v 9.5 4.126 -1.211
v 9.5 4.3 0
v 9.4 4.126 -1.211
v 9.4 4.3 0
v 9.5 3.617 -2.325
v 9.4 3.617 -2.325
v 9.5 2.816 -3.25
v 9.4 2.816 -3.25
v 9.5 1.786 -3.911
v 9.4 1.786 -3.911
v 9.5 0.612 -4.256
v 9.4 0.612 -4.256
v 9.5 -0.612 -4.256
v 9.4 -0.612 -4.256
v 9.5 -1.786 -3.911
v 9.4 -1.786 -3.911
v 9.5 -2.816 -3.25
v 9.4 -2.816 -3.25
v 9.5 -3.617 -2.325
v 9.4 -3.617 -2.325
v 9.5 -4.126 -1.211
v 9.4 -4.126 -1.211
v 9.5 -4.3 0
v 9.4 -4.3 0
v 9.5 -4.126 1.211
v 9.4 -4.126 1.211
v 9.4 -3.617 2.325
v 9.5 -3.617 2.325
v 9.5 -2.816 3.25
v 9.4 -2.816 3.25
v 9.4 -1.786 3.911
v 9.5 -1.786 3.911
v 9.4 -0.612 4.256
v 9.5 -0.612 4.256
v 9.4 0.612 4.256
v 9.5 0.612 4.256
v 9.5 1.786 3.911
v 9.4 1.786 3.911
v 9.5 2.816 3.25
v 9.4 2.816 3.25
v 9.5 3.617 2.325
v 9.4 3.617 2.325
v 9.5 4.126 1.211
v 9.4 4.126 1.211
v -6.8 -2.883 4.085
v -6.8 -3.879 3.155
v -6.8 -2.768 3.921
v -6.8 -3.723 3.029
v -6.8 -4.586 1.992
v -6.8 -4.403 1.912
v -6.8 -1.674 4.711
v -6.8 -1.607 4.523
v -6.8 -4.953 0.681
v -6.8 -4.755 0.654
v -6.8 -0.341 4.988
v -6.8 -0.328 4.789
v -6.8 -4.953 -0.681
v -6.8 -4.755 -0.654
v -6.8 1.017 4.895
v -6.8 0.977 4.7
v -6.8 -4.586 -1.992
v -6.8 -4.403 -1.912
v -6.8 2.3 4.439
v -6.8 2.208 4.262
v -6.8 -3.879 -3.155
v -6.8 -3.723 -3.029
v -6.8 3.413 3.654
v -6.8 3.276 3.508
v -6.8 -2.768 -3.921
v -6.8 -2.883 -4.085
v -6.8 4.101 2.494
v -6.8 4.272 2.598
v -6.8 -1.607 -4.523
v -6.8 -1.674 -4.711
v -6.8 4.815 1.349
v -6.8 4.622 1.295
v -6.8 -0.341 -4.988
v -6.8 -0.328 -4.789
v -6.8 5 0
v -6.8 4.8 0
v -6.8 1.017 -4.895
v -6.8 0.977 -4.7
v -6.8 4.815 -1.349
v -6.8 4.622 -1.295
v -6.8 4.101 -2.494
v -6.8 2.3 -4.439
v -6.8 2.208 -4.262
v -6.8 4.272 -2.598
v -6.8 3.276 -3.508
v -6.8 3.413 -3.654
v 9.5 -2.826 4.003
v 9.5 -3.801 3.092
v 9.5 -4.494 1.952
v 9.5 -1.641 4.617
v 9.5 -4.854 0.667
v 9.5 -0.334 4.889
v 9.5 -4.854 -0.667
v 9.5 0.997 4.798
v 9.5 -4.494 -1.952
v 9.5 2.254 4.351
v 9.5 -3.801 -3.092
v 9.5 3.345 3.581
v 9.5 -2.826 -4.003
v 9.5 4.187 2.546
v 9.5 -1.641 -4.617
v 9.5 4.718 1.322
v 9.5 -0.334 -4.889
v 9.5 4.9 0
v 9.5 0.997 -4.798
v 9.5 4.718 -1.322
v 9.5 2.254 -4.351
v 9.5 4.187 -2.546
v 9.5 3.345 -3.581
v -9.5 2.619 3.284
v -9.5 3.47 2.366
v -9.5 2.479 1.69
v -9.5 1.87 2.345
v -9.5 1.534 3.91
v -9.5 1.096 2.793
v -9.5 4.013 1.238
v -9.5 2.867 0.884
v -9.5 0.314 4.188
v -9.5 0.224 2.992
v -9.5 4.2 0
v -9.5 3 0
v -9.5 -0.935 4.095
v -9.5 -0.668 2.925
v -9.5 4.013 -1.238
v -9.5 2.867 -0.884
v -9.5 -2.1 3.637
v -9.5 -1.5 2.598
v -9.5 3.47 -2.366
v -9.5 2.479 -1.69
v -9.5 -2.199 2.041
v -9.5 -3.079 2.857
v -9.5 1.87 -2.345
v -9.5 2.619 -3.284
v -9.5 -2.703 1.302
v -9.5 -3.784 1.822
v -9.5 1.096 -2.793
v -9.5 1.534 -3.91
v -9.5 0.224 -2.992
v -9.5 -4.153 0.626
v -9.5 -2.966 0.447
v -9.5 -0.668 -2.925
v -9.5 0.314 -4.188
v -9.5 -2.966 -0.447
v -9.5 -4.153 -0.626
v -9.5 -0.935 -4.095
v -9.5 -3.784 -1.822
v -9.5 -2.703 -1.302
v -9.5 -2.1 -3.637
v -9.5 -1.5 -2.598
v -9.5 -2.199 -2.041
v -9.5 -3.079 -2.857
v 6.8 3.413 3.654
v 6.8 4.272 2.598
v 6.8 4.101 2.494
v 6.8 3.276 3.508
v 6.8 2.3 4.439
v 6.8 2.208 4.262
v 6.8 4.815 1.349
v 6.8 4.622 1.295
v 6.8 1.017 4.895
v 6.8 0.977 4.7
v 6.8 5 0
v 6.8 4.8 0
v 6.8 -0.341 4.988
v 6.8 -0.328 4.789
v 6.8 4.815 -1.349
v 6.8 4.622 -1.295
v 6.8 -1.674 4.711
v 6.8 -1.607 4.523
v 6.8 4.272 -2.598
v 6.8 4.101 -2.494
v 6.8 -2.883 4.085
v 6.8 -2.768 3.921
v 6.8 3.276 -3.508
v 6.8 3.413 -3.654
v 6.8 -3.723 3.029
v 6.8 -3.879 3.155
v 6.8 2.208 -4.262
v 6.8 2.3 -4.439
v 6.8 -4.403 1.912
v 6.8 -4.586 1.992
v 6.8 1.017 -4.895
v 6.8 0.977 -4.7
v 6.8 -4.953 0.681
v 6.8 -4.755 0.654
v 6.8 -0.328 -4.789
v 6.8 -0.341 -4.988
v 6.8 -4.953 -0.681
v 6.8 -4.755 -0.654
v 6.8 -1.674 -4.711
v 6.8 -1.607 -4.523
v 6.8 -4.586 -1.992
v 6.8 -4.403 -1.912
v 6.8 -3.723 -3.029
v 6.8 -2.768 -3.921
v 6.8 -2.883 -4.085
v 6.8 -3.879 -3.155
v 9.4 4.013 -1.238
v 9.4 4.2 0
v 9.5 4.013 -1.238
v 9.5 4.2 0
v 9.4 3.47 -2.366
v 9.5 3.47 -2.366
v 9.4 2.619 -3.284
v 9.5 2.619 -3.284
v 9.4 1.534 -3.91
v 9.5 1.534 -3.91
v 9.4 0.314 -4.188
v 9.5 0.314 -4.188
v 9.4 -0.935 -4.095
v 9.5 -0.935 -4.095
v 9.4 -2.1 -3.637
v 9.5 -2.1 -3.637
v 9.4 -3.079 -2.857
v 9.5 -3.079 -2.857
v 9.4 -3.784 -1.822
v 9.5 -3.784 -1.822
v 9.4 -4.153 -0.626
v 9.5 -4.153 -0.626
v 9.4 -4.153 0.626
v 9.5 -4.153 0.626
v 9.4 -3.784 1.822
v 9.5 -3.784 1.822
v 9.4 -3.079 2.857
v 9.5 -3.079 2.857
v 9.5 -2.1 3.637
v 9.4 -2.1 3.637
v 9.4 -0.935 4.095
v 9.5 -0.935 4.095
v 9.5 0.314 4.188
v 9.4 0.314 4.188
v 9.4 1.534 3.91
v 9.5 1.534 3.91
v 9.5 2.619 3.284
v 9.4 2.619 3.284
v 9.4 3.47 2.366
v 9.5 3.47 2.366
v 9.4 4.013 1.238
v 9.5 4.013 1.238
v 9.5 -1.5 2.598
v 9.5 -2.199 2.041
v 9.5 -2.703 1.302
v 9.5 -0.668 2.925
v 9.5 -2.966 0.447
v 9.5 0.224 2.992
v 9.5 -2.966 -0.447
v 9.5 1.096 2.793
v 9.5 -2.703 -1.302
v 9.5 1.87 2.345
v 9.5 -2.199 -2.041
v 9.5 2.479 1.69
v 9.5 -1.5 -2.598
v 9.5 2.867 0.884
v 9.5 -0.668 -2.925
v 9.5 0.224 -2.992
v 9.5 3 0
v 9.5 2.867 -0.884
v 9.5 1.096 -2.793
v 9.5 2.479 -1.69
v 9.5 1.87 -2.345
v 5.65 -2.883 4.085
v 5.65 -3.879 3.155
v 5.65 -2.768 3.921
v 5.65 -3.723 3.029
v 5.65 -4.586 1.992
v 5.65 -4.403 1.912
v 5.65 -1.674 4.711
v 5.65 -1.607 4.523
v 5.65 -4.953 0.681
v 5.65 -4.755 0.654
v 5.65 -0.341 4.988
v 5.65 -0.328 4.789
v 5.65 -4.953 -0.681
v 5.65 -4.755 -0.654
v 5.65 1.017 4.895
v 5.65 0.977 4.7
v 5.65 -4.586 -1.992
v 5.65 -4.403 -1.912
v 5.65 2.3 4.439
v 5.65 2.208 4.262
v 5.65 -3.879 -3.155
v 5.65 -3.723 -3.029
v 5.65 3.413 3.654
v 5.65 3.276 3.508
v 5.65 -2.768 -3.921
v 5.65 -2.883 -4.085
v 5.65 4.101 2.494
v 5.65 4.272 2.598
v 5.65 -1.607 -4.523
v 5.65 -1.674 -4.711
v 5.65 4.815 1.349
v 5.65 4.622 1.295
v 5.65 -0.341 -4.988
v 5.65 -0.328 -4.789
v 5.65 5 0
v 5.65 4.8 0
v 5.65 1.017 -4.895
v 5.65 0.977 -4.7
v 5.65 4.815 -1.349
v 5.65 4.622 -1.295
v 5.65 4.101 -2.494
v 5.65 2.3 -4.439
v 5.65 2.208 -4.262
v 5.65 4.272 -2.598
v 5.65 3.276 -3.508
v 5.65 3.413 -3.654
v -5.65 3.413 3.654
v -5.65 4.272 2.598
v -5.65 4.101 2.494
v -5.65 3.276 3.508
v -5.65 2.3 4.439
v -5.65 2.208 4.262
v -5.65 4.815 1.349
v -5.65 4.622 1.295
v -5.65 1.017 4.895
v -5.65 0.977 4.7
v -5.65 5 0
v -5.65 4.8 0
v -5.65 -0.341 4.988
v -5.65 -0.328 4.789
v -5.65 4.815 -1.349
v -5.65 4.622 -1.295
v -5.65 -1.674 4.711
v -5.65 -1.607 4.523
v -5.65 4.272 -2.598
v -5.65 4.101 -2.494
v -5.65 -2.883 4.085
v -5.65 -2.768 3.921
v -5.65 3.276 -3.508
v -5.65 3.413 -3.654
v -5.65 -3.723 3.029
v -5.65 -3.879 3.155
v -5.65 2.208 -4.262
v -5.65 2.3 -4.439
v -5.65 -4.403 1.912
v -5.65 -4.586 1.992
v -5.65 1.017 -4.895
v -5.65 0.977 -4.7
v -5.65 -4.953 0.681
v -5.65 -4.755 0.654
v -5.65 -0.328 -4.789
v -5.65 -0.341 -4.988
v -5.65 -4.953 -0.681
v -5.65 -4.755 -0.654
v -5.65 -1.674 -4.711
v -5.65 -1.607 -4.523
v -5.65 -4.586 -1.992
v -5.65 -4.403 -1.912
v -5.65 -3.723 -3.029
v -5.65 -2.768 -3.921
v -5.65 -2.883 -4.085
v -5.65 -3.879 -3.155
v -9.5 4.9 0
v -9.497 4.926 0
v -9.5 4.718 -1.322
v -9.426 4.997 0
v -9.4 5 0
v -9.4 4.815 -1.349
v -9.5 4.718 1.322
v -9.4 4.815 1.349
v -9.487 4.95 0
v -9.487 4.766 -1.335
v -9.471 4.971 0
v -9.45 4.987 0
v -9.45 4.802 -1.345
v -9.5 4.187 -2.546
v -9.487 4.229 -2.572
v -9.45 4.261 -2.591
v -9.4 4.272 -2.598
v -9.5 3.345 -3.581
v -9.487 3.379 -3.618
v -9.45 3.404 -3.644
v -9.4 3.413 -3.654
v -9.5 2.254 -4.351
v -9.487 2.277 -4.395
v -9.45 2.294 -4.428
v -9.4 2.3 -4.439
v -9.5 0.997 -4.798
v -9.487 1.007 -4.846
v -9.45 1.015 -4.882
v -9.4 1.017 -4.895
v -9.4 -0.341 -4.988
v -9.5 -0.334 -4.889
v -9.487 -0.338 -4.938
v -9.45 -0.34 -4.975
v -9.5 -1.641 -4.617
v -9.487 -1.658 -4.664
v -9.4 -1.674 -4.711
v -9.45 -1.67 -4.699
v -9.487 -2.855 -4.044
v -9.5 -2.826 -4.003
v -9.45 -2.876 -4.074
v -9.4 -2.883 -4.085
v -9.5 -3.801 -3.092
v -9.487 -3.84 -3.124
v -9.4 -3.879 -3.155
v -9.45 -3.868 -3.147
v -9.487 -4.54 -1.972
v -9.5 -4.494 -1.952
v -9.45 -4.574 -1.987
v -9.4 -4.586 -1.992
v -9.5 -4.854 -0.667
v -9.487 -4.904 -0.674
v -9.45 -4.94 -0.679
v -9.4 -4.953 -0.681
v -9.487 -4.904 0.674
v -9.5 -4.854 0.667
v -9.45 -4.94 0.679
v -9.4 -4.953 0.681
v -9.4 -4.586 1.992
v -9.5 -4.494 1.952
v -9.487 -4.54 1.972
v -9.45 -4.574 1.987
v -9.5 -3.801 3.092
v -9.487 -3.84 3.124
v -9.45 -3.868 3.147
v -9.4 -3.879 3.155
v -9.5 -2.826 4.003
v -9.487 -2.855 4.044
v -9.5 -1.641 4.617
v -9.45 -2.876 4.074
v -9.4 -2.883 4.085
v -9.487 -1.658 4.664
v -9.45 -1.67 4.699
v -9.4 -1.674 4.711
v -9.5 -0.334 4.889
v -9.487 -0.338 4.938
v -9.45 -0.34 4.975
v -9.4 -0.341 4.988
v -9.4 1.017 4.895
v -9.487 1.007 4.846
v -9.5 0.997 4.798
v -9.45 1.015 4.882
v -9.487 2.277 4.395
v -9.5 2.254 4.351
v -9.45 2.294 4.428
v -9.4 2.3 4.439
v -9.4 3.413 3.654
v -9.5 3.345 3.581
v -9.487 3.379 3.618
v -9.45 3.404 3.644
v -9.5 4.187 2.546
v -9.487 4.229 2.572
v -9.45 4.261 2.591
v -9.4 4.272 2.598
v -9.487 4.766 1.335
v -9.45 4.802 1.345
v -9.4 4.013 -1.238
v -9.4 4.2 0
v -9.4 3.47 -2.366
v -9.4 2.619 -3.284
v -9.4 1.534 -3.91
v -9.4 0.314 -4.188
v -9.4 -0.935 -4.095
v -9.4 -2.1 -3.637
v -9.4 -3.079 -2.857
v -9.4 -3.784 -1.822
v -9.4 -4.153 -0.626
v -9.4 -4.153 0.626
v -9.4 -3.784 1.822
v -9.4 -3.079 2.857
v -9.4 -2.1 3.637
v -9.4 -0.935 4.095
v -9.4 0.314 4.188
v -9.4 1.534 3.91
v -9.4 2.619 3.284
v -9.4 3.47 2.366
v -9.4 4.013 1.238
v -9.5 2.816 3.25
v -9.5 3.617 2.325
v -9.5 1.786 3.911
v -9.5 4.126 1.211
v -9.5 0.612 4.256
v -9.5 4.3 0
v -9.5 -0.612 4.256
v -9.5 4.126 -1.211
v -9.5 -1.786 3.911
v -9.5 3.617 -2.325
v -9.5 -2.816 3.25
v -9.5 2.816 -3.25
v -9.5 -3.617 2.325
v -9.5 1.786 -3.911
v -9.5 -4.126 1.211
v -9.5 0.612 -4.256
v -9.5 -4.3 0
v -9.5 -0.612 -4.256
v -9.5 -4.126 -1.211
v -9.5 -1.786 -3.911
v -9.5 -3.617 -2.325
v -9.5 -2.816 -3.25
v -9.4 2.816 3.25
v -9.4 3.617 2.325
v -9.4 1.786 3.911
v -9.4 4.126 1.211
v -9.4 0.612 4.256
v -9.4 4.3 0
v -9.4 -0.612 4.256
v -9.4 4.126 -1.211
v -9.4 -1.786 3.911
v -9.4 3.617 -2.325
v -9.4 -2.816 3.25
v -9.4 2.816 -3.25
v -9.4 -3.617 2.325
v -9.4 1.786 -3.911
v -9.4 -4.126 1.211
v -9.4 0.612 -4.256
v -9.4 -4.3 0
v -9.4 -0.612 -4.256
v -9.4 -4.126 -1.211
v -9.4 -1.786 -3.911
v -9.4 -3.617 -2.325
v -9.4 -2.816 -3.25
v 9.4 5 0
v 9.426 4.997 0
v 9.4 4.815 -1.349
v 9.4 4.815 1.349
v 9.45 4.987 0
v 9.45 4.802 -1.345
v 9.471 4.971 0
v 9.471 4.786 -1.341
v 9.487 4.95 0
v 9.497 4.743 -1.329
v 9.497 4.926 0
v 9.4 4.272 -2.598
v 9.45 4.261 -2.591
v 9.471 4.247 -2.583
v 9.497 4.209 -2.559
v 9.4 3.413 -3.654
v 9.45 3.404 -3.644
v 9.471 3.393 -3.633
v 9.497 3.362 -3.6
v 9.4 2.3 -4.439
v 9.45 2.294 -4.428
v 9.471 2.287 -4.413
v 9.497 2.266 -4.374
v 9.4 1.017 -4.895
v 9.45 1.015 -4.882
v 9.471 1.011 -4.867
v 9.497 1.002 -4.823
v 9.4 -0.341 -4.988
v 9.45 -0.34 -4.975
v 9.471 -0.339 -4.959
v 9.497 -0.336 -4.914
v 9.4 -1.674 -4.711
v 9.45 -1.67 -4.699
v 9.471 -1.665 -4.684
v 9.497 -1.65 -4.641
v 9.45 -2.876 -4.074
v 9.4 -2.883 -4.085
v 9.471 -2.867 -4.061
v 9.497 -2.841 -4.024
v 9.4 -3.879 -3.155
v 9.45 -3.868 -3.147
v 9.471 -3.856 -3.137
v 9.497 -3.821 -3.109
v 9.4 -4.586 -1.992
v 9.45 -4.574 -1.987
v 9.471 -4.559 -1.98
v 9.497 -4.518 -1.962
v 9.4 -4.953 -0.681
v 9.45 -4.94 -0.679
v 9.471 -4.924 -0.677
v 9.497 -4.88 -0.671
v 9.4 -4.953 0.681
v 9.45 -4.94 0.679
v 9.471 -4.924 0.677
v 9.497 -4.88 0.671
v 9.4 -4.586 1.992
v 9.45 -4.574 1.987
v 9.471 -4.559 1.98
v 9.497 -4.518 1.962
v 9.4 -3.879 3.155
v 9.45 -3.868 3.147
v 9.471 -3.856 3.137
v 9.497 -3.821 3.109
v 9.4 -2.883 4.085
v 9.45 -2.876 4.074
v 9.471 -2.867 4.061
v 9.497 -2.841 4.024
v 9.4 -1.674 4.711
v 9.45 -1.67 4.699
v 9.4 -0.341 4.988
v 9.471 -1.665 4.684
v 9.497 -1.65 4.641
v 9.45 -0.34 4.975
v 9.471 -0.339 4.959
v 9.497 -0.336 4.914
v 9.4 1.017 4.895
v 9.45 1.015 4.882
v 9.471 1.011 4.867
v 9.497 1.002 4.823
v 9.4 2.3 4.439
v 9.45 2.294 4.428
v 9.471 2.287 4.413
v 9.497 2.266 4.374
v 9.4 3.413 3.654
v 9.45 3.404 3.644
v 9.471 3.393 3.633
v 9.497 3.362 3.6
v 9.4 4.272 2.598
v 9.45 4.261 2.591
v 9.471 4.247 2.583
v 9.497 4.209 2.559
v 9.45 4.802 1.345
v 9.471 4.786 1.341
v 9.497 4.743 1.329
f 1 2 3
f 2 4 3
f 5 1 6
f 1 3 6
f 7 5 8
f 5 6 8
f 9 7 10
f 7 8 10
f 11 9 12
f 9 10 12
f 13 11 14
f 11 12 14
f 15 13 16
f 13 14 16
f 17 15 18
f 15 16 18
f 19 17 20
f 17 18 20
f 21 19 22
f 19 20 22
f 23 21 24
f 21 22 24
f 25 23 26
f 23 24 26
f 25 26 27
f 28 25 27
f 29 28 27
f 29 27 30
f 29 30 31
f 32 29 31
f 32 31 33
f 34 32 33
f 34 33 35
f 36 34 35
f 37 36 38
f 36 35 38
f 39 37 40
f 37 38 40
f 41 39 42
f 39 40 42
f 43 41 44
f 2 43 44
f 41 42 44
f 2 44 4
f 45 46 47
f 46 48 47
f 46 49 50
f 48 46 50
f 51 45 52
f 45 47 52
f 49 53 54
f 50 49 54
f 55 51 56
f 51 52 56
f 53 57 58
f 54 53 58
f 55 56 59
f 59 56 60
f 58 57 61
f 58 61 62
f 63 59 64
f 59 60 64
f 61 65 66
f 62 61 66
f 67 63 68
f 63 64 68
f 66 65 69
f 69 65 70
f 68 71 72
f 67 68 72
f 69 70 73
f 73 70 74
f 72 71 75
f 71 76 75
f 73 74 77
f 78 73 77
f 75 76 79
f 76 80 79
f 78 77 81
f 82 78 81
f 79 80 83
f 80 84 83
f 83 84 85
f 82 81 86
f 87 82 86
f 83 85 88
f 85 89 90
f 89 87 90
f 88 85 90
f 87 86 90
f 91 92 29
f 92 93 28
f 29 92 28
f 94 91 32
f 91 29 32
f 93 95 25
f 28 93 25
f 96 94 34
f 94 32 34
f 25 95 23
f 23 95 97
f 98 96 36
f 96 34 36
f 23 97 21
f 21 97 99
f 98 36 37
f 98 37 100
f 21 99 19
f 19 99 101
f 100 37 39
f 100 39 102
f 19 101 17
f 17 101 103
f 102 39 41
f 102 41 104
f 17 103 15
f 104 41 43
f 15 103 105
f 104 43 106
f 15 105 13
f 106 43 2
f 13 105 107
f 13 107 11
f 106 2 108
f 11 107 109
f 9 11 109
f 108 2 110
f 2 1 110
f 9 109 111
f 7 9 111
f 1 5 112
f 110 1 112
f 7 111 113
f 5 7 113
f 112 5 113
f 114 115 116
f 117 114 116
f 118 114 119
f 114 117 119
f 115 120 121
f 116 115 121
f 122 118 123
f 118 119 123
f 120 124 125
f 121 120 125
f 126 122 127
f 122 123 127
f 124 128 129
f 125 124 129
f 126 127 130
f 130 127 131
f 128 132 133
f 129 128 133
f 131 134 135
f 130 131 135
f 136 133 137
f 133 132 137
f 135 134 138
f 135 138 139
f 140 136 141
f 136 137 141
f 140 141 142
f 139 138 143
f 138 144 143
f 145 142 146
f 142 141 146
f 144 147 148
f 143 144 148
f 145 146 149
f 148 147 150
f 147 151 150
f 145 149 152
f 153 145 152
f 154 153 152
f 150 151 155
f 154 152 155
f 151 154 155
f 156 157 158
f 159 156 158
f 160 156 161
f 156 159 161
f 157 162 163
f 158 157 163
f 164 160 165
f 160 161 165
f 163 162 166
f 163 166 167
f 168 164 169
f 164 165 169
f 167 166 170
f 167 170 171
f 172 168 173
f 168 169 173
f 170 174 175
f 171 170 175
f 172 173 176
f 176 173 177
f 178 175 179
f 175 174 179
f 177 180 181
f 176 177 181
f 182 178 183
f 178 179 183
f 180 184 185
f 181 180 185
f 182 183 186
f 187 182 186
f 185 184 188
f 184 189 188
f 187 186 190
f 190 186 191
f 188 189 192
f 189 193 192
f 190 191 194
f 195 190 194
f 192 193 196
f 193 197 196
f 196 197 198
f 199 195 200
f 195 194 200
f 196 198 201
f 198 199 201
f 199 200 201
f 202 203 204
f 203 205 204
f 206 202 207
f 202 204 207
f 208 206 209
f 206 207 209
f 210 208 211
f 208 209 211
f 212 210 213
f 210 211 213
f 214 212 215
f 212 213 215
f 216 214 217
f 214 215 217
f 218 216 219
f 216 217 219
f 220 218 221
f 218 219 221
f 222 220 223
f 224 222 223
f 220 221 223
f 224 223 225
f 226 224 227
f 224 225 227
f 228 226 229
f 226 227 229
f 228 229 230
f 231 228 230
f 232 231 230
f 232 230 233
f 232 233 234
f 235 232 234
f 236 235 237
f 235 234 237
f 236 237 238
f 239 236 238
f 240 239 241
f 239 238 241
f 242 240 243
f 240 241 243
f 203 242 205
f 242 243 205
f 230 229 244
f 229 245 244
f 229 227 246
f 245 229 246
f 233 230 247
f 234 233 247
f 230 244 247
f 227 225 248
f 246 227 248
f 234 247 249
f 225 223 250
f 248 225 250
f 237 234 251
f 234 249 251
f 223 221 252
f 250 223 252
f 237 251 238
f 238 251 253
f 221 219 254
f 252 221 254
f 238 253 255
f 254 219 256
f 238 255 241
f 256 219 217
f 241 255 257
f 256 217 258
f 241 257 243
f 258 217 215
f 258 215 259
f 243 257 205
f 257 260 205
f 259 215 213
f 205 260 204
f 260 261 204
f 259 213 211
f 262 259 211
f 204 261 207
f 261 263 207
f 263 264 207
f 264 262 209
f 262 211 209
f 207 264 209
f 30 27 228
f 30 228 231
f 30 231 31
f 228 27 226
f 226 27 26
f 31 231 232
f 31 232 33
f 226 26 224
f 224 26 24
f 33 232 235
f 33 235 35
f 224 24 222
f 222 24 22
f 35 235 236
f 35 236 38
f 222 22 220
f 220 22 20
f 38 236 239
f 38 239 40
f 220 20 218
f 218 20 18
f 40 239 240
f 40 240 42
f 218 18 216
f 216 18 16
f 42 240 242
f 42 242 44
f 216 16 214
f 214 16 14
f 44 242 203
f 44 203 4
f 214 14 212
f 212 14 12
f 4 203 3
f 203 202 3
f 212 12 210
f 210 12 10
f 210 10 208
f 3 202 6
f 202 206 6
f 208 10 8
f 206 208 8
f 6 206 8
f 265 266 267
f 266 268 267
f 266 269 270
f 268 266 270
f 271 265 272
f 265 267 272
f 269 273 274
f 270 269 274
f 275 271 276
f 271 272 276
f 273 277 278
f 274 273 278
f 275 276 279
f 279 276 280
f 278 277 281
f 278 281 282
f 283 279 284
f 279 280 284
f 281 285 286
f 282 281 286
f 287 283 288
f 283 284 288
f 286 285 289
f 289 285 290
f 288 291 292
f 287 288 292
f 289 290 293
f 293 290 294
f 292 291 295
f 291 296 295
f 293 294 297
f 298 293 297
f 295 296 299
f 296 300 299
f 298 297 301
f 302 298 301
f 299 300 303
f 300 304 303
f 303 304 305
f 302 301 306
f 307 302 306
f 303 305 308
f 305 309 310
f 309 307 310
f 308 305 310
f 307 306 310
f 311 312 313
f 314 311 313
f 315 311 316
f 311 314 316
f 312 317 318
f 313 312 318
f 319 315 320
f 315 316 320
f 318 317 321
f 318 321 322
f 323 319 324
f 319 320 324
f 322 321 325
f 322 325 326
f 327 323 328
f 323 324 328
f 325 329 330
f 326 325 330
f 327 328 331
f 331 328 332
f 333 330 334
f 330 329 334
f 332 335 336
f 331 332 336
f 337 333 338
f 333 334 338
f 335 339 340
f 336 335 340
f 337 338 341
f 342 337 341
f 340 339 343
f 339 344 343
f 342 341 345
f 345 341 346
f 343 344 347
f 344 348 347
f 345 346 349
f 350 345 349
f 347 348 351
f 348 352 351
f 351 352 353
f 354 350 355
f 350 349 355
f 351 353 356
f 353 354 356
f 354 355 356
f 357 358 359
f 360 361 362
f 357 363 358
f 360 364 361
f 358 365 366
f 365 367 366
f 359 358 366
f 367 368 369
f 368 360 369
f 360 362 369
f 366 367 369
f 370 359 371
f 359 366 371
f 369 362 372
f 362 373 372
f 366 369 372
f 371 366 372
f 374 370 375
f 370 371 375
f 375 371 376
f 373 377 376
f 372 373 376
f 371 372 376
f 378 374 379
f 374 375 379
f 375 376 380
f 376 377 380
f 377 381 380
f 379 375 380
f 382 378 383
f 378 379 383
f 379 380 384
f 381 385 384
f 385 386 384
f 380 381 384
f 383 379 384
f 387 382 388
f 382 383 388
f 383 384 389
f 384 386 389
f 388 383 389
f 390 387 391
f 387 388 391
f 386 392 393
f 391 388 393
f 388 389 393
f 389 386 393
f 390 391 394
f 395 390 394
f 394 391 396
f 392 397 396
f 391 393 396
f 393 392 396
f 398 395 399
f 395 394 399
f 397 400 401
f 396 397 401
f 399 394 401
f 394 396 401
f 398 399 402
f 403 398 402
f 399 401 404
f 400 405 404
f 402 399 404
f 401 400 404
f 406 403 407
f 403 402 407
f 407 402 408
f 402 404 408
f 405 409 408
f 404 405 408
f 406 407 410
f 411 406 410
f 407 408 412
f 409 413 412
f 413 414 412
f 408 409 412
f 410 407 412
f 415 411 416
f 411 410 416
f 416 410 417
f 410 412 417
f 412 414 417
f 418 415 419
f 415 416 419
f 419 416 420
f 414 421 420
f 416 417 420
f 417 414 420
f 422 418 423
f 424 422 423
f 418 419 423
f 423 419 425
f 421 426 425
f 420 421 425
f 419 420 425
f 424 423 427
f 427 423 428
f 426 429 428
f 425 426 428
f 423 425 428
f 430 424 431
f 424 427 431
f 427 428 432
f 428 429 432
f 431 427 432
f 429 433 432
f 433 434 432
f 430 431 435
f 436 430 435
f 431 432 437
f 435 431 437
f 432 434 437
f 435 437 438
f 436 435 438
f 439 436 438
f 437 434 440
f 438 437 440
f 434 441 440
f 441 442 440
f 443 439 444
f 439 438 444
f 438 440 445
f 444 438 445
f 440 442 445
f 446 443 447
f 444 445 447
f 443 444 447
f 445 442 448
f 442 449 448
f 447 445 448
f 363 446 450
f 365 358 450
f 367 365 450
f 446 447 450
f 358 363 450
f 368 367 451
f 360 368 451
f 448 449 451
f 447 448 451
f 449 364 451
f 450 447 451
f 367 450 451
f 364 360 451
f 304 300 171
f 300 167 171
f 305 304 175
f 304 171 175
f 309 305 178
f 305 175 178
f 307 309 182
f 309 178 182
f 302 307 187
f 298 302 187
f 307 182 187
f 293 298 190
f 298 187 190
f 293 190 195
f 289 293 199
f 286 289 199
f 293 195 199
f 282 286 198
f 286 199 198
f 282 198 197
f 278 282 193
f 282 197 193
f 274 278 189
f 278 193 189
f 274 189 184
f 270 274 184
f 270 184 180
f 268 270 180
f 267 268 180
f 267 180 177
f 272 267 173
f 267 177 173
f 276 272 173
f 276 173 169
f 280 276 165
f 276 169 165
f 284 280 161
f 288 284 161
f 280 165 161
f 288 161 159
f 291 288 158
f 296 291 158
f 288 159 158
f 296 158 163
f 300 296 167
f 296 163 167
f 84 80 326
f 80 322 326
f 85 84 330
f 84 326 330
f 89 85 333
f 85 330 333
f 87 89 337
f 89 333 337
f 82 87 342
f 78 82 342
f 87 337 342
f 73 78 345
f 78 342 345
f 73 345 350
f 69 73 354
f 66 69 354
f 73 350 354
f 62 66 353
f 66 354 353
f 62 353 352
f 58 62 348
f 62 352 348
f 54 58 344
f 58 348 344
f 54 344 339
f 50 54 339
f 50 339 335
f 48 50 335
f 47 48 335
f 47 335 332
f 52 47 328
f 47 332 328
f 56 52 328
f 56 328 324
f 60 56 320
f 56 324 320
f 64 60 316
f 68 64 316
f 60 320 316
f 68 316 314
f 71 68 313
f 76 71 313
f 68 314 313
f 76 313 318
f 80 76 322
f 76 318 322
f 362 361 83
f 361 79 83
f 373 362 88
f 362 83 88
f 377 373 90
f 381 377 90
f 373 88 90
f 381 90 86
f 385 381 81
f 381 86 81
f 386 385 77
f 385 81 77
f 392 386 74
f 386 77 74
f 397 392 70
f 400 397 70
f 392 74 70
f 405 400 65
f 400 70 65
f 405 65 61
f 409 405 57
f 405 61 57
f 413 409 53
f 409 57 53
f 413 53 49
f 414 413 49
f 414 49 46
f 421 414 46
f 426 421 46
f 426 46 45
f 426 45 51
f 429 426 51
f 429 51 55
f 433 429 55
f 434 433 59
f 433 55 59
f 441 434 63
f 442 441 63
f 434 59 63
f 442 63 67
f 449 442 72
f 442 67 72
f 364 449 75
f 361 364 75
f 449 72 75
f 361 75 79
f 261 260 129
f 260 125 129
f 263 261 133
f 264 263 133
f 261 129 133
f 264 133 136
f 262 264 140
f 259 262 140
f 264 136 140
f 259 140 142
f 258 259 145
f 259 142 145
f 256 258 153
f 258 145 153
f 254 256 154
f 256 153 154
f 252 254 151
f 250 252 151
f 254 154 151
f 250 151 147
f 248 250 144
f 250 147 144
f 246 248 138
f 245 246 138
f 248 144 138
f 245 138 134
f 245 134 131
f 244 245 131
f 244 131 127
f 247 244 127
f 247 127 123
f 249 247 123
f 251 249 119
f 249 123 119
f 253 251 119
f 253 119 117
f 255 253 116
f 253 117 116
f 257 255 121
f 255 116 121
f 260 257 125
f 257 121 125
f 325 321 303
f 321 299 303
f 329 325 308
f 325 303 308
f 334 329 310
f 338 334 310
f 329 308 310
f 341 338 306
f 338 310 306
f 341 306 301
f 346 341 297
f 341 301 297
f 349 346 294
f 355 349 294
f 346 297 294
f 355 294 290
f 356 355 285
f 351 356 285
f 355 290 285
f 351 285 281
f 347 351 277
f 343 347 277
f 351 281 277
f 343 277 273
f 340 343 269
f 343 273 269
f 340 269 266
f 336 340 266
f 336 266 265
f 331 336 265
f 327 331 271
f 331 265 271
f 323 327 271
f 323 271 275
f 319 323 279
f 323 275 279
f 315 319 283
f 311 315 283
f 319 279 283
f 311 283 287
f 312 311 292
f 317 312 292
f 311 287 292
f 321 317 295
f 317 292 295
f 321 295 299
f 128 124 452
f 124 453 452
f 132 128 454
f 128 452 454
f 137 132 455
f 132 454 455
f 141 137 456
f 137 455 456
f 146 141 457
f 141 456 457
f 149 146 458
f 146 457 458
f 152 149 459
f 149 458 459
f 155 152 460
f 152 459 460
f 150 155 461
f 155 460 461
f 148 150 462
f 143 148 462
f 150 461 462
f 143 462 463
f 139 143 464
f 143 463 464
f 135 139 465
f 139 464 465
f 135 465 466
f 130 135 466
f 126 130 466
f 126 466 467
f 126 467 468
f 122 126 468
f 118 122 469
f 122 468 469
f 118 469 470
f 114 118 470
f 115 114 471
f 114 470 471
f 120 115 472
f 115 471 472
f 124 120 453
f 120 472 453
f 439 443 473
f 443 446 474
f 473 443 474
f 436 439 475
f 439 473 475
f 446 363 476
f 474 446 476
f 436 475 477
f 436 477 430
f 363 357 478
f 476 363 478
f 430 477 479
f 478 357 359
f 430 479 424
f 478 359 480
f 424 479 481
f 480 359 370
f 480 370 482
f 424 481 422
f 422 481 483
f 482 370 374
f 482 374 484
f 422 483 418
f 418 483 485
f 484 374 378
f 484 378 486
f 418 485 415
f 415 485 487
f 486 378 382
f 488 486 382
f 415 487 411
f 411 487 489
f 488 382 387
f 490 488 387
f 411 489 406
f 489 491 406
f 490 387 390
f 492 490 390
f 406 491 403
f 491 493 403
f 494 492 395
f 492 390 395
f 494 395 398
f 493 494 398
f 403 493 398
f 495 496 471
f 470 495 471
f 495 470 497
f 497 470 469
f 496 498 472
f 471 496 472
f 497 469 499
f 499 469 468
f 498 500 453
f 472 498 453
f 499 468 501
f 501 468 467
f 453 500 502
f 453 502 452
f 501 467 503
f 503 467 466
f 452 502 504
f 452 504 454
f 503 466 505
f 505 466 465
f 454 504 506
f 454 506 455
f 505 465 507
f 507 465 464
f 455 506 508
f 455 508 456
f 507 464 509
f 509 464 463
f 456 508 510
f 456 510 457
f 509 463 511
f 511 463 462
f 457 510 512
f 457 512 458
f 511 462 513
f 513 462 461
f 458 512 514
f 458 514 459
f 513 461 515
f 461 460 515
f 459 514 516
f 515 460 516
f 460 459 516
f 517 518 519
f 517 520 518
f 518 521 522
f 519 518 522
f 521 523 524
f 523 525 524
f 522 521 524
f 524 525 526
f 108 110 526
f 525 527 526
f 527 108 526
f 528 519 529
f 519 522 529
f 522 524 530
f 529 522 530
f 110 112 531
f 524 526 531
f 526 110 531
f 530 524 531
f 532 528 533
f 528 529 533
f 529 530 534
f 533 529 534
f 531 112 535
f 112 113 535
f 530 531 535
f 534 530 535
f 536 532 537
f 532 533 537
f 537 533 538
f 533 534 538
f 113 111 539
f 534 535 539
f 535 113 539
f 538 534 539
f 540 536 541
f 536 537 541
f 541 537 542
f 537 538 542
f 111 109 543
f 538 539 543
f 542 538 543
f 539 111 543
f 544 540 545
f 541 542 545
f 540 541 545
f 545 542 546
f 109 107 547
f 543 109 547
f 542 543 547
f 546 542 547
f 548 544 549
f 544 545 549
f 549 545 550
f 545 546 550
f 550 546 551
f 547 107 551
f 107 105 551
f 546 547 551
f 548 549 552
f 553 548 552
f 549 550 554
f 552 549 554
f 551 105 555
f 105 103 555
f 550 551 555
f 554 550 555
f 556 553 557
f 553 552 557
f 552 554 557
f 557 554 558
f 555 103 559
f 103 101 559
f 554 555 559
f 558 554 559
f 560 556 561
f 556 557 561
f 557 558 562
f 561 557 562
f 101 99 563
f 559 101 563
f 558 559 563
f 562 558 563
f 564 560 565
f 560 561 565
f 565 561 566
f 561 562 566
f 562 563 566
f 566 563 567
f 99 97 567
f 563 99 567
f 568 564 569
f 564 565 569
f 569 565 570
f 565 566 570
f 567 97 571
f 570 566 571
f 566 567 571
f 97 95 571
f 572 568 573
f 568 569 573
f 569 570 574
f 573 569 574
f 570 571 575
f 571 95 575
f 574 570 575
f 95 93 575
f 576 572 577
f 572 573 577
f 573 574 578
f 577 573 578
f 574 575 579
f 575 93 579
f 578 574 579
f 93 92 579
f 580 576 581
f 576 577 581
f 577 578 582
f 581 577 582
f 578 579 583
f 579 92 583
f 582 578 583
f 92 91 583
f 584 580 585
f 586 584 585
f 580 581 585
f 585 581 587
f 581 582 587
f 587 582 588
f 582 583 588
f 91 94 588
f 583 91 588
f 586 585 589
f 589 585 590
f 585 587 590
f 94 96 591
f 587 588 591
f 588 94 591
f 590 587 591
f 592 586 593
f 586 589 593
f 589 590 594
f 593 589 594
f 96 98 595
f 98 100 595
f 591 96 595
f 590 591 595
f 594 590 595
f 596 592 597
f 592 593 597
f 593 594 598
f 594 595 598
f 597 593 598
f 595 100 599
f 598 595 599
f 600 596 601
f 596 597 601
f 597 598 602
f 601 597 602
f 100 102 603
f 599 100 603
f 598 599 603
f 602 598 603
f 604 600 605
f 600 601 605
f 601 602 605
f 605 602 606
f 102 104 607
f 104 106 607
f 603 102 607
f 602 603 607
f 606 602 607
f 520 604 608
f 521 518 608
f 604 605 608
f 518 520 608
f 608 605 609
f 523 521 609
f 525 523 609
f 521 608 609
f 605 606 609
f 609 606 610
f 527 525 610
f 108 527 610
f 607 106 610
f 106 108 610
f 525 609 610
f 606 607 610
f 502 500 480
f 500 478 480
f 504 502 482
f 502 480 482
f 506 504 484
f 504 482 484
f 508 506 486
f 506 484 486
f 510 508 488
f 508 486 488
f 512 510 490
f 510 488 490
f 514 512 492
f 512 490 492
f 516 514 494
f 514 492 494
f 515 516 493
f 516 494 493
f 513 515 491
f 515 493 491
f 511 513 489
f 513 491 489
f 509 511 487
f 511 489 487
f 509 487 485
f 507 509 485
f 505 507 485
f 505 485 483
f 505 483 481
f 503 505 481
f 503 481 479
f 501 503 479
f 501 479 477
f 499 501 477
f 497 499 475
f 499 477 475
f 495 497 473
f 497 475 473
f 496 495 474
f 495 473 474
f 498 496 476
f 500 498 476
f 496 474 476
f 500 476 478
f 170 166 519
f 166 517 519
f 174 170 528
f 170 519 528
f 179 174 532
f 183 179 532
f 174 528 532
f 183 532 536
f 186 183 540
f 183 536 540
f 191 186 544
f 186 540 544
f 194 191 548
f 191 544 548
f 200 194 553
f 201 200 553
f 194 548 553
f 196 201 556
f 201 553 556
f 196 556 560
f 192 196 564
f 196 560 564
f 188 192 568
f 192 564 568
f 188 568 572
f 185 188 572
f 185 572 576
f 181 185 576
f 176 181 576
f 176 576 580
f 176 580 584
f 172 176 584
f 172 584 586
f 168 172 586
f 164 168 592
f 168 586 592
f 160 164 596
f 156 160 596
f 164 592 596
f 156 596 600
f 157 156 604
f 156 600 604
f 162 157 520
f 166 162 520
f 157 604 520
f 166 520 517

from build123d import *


with BuildPart() as part:
    # Sketch1 → Revolve1 (revolve)
    with BuildSketch(Plane(origin=(0, 0, 0), x_dir=(-1, 0, 0), z_dir=(0, 0, -1))):
        with BuildLine():
            Line((-9.4, 4.2), (-9.5, 4.2))
            Line((-9.5, 4.2), (-9.5, 3))
            Line((-9.5, 3), (9.5, 3))
            Line((9.5, 3), (9.5, 4.2))
            Line((9.5, 4.2), (9.4, 4.2))
            Line((9.4, 4.2), (9.4, 4.3))
            Line((9.4, 4.3), (9.5, 4.3))
            Line((9.5, 4.3), (9.5, 4.9))
            ThreePointArc((9.5, 4.9), (9.470710678, 4.970710678), (9.4, 5))
            Line((9.4, 5), (6.8, 5))
            Line((6.8, 5), (6.8, 4.8))
            Line((6.8, 4.8), (5.65, 4.8))
            Line((5.65, 4.8), (5.65, 5))
            Line((5.65, 5), (-5.65, 5))
            Line((-5.65, 5), (-5.65, 4.8))
            Line((-5.65, 4.8), (-6.8, 4.8))
            Line((-6.8, 4.8), (-6.8, 5))
            Line((-6.8, 5), (-9.4, 5))
            ThreePointArc((-9.4, 5), (-9.470710678, 4.970710678), (-9.5, 4.9))
            Line((-9.5, 4.9), (-9.5, 4.3))
            Line((-9.5, 4.3), (-9.4, 4.3))
            Line((-9.4, 4.3), (-9.4, 4.2))
        make_face()
    revolve(axis=Axis((9.5, 0, 0), (-1, 0, 0)))


solid = part.part
